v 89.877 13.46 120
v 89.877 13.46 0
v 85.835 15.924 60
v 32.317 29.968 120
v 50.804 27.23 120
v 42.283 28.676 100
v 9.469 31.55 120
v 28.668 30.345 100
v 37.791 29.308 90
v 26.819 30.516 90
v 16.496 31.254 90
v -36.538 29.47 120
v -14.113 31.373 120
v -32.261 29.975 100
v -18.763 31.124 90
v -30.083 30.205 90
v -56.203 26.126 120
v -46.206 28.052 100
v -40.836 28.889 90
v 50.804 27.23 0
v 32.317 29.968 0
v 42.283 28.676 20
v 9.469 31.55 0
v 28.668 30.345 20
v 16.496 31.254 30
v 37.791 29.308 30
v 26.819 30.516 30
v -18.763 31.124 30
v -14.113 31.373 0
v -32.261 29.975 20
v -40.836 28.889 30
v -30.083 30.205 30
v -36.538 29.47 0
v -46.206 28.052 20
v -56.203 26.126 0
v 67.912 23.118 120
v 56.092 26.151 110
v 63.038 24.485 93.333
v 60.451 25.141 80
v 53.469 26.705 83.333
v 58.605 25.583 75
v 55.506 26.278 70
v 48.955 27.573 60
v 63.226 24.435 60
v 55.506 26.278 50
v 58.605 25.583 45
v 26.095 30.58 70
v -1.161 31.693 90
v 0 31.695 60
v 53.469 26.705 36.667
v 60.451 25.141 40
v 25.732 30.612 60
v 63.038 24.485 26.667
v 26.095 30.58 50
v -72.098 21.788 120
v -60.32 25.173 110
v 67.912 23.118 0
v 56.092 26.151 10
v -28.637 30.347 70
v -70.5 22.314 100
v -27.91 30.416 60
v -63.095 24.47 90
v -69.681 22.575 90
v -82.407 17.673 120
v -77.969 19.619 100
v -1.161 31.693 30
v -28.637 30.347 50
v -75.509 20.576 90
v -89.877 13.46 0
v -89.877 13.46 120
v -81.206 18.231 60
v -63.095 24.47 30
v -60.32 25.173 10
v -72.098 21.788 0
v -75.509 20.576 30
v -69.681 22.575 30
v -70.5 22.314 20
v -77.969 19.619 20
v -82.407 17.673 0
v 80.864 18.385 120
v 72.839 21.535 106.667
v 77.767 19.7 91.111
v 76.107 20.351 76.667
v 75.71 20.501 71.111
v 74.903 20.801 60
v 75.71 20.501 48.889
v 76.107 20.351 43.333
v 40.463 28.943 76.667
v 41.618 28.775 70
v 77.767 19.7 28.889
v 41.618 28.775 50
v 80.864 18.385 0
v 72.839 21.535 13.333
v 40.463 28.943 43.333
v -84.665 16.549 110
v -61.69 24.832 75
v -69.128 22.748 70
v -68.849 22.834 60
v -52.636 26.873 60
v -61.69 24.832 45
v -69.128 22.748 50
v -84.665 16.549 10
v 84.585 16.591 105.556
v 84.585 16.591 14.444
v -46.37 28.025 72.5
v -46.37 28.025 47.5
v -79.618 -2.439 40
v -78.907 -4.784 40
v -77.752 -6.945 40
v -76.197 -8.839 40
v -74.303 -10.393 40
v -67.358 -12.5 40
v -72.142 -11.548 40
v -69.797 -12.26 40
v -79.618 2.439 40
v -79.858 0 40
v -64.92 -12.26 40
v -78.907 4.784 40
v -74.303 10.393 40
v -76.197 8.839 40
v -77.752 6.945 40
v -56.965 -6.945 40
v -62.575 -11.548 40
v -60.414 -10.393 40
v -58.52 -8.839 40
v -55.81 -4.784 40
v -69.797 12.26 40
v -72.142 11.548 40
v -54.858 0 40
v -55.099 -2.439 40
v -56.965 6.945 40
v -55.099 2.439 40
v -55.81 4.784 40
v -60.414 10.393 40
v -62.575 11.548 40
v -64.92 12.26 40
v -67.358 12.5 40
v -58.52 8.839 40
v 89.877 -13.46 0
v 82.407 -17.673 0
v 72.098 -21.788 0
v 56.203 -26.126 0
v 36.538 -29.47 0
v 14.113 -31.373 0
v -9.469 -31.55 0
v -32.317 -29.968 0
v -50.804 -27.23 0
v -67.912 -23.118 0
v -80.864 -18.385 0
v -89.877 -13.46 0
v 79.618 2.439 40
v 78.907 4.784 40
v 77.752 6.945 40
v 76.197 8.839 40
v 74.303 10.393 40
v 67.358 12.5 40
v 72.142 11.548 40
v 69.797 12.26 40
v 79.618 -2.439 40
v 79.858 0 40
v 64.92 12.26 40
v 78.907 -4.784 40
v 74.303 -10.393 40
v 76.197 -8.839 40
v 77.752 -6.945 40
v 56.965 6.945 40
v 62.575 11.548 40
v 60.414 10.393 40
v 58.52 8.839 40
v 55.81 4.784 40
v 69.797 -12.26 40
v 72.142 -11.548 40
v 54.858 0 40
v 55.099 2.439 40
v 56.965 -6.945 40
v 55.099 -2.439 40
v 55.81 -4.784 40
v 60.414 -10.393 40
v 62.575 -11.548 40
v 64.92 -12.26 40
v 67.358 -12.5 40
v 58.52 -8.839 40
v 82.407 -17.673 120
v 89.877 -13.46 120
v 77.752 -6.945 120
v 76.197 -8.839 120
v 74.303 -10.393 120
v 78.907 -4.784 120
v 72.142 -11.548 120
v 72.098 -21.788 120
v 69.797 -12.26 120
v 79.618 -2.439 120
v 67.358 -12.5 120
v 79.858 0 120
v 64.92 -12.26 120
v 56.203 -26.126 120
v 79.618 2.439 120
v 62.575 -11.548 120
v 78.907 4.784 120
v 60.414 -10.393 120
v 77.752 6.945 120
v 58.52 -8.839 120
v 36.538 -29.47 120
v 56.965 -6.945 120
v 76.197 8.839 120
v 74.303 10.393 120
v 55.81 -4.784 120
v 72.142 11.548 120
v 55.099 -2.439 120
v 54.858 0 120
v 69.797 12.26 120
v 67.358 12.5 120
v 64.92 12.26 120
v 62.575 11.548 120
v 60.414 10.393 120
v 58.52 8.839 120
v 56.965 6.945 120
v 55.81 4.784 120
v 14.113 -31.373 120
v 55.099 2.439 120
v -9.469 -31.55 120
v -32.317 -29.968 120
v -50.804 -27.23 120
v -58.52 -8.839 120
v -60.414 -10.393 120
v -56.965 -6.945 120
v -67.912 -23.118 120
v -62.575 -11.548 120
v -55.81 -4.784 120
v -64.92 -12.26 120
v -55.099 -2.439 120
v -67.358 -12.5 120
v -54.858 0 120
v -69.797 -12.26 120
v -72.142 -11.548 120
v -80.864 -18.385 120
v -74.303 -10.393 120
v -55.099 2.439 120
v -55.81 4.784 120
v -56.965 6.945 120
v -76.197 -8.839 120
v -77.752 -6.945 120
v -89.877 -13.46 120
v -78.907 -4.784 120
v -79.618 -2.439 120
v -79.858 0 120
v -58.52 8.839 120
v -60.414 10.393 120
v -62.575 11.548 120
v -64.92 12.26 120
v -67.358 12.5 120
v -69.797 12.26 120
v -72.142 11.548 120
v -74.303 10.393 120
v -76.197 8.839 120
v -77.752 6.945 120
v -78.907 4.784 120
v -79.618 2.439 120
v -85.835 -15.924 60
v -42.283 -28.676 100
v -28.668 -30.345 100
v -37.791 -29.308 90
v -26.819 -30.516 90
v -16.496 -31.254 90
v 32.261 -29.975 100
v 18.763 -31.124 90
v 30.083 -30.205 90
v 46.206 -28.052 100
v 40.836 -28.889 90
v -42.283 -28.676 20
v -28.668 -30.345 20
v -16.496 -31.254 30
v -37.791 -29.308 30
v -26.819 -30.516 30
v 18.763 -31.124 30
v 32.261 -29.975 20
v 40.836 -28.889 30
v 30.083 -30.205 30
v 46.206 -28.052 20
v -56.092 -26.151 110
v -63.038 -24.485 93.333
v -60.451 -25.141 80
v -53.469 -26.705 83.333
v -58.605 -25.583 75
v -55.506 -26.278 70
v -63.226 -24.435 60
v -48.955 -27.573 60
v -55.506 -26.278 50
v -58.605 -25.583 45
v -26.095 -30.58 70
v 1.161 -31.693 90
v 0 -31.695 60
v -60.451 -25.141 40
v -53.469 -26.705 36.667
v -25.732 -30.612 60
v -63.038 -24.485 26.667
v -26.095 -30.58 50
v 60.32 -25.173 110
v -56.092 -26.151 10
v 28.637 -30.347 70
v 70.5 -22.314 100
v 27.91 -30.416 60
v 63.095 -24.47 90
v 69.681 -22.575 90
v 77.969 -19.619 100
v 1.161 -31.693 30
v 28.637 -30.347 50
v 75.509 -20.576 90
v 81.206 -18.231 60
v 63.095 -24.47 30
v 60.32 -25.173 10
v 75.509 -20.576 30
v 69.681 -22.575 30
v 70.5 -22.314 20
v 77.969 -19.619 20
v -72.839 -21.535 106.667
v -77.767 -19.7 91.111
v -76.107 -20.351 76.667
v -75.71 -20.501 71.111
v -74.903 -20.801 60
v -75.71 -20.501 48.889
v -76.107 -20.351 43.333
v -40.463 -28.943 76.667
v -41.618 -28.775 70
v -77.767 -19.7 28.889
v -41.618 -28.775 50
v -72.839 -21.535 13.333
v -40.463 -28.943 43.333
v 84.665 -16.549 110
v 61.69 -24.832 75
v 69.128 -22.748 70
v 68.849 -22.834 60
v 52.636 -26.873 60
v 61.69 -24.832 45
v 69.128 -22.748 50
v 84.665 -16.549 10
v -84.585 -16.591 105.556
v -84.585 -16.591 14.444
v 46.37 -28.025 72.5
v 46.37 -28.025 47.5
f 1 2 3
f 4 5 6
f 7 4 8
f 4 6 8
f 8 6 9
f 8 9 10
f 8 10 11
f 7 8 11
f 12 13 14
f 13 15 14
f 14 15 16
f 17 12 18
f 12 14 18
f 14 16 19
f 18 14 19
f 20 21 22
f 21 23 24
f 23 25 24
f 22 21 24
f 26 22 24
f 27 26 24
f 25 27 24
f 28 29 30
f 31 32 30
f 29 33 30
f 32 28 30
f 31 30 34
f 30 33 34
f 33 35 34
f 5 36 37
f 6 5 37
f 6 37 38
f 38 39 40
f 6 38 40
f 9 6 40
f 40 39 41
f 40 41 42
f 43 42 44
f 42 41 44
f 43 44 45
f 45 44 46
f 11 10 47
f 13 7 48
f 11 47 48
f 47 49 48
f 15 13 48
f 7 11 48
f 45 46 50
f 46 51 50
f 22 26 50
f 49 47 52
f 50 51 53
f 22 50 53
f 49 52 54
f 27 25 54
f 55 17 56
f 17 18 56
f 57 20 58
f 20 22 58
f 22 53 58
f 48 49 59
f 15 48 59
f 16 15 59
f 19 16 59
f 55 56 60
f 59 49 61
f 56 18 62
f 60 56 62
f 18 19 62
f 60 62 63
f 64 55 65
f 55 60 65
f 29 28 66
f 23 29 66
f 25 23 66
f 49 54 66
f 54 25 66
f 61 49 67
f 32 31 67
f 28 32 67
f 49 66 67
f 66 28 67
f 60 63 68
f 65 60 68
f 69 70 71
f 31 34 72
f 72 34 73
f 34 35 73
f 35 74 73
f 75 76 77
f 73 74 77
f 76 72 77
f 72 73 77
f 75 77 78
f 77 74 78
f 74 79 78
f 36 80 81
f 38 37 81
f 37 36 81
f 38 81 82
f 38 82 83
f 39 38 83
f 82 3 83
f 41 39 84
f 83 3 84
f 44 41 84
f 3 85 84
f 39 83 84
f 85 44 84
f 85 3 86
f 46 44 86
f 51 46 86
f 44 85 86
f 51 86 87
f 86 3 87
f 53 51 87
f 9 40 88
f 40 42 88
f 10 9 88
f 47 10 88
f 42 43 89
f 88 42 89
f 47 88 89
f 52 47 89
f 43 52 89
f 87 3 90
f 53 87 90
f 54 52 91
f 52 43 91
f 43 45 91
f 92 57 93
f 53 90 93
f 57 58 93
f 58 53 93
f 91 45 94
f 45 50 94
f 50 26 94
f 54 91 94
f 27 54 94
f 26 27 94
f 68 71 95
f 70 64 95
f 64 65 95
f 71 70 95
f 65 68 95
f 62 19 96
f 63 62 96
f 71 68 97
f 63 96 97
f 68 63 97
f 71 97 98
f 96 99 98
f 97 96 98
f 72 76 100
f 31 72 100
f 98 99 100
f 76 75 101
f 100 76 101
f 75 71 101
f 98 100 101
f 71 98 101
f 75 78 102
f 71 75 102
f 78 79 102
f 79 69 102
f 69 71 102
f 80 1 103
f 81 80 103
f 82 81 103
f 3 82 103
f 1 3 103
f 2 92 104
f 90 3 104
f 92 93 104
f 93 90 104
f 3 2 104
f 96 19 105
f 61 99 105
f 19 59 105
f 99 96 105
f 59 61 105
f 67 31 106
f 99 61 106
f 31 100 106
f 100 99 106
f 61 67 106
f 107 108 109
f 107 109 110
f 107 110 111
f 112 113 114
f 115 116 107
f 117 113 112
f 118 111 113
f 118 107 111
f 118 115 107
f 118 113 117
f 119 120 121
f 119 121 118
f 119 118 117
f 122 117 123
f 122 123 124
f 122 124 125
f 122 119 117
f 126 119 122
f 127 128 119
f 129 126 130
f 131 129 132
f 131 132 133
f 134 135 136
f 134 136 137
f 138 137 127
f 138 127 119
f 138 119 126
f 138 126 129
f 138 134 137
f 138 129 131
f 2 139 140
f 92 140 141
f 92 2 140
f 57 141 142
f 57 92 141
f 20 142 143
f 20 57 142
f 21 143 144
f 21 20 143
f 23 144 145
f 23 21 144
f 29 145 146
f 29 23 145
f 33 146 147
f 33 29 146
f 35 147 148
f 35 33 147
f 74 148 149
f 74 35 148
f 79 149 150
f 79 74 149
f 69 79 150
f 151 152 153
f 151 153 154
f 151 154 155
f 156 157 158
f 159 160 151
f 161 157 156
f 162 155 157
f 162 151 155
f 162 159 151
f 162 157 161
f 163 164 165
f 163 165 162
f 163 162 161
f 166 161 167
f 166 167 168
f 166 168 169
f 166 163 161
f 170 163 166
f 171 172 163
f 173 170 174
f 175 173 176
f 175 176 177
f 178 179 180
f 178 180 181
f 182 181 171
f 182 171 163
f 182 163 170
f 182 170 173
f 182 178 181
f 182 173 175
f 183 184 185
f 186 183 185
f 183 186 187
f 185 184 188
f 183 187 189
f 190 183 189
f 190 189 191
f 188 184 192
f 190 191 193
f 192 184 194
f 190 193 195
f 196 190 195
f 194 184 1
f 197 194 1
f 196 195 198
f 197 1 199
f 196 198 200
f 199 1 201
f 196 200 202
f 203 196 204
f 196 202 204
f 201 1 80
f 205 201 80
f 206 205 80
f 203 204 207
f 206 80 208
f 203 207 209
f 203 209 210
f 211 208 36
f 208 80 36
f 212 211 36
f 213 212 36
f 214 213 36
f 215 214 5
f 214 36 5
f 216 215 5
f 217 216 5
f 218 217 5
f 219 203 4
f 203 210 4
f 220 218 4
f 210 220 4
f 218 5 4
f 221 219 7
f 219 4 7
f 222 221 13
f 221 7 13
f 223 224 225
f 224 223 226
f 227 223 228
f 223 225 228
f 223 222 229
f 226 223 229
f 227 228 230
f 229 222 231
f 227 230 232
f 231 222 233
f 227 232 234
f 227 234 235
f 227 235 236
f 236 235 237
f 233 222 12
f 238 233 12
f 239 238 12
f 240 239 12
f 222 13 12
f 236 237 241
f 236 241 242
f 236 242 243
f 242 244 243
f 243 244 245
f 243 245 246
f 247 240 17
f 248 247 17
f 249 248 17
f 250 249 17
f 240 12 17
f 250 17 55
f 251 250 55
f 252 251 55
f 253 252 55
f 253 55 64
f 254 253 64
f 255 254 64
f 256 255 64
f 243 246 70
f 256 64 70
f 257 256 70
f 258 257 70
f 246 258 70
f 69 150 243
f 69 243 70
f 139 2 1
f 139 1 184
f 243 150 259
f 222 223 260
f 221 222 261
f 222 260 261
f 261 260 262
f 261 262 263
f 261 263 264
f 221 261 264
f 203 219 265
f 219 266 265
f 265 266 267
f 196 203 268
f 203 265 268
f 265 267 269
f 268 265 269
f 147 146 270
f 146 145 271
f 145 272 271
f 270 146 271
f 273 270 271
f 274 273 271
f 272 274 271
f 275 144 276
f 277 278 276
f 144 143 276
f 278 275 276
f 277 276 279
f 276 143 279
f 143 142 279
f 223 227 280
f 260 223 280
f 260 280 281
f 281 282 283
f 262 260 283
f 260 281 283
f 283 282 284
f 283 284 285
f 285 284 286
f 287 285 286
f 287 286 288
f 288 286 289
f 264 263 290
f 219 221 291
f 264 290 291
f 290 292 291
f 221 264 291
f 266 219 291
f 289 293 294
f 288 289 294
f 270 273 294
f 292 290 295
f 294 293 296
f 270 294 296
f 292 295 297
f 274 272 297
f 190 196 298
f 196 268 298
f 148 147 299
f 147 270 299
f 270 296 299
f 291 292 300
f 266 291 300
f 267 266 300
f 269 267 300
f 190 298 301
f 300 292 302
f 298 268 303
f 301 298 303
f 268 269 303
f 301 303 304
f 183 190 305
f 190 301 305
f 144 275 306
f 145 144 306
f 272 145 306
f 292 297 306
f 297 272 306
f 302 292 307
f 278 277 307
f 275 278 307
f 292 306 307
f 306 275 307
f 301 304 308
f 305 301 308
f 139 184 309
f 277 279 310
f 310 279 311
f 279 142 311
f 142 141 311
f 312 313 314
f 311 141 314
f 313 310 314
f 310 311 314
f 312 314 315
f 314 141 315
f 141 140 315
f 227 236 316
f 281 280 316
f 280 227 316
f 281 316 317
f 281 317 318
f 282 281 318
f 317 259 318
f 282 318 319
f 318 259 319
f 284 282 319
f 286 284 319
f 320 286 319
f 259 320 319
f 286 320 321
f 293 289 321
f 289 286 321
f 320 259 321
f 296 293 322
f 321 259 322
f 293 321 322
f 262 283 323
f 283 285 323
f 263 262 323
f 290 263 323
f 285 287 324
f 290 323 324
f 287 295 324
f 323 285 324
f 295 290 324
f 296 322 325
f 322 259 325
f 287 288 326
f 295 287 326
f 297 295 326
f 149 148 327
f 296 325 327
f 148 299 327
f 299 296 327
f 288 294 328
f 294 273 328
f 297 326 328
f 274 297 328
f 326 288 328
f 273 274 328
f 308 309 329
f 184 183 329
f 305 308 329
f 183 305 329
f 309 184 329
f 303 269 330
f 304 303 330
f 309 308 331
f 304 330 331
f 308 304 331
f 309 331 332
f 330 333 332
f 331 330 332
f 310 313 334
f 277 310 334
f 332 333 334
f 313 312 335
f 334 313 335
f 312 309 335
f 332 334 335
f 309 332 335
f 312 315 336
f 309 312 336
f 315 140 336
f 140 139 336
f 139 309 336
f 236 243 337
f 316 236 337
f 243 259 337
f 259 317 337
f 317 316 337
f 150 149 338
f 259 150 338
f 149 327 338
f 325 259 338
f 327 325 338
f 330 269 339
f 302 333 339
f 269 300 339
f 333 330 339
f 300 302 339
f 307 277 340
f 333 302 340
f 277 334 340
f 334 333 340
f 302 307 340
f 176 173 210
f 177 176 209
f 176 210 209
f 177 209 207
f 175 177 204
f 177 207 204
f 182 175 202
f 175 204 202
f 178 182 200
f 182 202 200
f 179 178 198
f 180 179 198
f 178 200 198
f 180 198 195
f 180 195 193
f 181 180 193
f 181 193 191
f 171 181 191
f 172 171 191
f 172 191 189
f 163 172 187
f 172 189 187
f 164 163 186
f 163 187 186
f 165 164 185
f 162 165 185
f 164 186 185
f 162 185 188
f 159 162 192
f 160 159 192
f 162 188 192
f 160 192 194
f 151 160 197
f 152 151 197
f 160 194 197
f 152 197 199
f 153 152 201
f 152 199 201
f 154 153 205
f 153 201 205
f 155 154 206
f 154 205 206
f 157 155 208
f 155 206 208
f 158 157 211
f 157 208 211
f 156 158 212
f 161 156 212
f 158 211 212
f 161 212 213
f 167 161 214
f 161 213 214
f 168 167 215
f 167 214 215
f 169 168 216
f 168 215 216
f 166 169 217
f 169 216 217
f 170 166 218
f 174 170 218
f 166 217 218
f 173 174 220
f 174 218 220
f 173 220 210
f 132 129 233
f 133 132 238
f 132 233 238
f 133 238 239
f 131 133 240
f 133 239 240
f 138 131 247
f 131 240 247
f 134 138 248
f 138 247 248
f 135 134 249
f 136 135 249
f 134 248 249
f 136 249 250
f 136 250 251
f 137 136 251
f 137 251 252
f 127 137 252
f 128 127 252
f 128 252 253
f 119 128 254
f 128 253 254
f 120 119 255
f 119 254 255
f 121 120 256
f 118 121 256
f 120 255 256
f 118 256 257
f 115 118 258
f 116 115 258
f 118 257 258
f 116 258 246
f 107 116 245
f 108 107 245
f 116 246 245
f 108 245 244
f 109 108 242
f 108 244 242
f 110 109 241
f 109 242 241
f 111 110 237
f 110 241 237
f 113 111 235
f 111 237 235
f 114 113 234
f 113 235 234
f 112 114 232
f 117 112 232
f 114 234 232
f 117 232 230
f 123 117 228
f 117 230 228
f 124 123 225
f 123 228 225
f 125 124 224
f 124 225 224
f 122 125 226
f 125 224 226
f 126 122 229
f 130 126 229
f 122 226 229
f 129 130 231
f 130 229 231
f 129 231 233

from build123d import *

# Parameters (mm, degrees)
BOSS_EXTRUDE1_DEPTH = 120
SKETCH2_R           = 12.5
CUT_EXTRUDE1_DEPTH  = 80


with BuildPart() as part:
    # Sketch1 → Boss-Extrude1 (new body)
    with BuildSketch(Plane.XY):
        with BuildLine():
            Line((-89.876617225, -13.45998777), (-89.876617225, 13.45998777))
            add(Edge.make_bspline(
                [(89.876617225, 13.45998777), (0, 74.633199683), (-89.876617225, 13.45998777)],
                knots=[3.580195105, 3.580195105, 3.580195105, 5.844582856, 5.844582856, 5.844582856], degree=2, weights=[1, 0.424674615, 1]))
            Line((89.876617225, 13.45998777), (89.876617225, -13.45998777))
            add(Edge.make_bspline(
                [(-89.876617225, -13.45998777), (0, -74.633199683), (89.876617225, -13.45998777)],
                knots=[0.438602452, 0.438602452, 0.438602452, 2.702990202, 2.702990202, 2.702990202], degree=2, weights=[1, 0.424674615, 1]))
        make_face()
    extrude(amount=BOSS_EXTRUDE1_DEPTH)

    # Sketch2 → Cut-Extrude1 (cut)
    with BuildSketch(Plane.XY.offset(120)):
        with Locations((-67.358364495, 0)):
            Circle(SKETCH2_R)
        with Locations(Location((67.358364495, 0, 0), (0, 0, 180))):
            Circle(SKETCH2_R)
    extrude(amount=-CUT_EXTRUDE1_DEPTH, mode=Mode.SUBTRACT)


solid = part.part
